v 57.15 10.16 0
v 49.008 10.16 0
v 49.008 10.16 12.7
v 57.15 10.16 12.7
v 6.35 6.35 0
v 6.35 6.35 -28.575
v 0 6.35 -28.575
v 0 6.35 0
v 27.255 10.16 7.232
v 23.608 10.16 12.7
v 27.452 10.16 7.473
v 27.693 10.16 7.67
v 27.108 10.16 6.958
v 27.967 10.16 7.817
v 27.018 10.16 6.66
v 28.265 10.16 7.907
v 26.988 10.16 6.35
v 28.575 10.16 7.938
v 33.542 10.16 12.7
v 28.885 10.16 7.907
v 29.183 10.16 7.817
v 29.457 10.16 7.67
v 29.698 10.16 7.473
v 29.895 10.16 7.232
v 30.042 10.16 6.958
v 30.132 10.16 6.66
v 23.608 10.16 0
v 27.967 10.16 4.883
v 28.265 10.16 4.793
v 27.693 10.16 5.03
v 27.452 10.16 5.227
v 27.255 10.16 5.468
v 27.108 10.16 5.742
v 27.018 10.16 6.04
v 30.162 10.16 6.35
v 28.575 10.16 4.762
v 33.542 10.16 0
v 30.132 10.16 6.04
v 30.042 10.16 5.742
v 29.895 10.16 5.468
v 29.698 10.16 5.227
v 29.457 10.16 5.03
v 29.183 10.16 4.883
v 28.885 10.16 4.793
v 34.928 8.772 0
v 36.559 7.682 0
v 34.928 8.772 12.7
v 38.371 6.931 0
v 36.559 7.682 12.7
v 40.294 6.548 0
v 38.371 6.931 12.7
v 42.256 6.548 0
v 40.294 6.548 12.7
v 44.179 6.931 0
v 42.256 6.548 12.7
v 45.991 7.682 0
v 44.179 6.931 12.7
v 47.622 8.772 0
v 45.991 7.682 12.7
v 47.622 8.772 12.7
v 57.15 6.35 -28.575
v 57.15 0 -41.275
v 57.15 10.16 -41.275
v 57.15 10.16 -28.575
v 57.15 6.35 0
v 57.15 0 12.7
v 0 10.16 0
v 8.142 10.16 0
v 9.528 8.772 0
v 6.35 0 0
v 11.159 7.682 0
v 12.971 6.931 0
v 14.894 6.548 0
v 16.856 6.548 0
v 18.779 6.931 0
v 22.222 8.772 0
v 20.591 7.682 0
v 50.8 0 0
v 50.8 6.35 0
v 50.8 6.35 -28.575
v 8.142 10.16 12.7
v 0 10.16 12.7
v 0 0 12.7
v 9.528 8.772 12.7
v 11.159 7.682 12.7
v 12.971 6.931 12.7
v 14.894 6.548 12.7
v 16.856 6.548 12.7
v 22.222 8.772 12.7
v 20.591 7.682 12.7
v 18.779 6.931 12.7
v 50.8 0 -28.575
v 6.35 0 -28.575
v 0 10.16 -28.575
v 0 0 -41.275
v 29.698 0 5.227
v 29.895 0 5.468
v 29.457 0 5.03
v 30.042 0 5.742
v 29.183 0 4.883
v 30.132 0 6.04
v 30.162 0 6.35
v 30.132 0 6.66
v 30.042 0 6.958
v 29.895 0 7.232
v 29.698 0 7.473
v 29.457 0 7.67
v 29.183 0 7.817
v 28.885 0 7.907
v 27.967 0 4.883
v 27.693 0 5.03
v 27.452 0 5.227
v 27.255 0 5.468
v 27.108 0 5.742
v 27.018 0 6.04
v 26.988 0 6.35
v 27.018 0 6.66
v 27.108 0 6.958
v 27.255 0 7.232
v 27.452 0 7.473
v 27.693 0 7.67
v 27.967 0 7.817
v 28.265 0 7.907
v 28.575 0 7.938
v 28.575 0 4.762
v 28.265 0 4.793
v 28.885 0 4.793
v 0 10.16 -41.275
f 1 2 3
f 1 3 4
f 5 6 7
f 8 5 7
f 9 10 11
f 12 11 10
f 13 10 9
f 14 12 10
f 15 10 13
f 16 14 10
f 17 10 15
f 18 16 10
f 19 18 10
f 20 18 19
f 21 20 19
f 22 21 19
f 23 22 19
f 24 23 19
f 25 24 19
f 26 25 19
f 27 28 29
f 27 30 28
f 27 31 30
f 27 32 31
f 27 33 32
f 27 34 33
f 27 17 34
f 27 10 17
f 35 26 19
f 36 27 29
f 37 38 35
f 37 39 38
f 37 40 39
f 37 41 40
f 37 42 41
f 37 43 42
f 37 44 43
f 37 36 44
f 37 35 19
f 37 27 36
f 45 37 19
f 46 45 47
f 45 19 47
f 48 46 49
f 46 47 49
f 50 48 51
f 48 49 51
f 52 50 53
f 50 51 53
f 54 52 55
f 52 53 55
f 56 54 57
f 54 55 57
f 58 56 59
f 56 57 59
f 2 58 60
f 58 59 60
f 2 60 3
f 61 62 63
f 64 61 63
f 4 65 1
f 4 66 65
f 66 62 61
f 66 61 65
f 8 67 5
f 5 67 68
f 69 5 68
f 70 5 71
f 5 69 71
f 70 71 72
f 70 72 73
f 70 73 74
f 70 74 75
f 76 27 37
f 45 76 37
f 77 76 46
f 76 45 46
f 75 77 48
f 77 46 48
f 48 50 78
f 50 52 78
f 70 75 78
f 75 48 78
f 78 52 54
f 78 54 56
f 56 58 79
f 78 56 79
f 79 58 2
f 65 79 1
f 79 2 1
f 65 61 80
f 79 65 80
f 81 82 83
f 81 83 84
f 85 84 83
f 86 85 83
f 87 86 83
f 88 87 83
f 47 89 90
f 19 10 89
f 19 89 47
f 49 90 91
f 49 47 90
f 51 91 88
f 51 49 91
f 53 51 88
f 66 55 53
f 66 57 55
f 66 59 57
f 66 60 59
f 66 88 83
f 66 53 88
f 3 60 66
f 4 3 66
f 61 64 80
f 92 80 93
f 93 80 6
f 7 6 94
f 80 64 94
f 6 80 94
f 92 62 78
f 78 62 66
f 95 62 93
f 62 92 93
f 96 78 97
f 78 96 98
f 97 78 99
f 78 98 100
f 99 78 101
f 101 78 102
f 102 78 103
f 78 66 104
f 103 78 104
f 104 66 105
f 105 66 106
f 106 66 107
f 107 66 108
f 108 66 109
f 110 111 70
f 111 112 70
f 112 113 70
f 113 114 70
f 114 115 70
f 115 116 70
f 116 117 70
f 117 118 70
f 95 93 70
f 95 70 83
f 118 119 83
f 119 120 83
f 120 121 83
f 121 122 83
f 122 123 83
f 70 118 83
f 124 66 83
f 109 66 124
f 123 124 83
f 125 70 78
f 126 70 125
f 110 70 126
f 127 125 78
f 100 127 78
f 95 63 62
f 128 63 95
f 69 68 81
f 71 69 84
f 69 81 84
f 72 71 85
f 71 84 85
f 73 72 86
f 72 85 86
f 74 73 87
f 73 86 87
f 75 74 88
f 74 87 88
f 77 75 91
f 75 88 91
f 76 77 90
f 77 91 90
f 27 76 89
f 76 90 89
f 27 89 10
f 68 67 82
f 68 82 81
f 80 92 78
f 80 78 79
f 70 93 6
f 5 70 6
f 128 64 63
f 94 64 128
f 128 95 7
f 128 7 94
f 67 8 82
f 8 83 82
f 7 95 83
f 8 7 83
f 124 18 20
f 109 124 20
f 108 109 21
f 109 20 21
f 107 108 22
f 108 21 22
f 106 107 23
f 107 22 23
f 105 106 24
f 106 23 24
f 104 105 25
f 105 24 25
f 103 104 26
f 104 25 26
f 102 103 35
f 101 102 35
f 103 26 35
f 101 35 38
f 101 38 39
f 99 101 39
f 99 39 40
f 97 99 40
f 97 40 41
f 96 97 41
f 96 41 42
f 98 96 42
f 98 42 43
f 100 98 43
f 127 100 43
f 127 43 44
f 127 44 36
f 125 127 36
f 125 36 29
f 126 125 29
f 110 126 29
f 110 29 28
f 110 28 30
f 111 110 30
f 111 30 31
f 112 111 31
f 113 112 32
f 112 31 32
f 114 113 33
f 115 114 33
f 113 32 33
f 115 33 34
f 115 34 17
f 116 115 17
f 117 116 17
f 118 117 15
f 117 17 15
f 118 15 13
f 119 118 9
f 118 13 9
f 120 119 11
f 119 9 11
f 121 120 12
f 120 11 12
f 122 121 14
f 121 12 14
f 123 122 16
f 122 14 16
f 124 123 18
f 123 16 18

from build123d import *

# Parameters (mm, degrees)
SKETCH4_W           = 57.15
SKETCH4_H           = 10.16
BOSS_EXTRUDE1_DEPTH = 12.7
SKETCH5_R           = 10
CUT_EXTRUDE1_DEPTH  = 60.419172832
SKETCH8_R           = 1.5875
CUT_EXTRUDE3_DEPTH  = 60.419172832
SKETCH9_W           = 6.35
SKETCH9_H           = 6.35
BOSS_EXTRUDE2_DEPTH = 28.575
SKETCH11_W          = 57.15
SKETCH11_H          = 10.16
BOSS_EXTRUDE3_DEPTH = 12.7


with BuildPart() as part:
    # Sketch4 → Boss-Extrude1 (new body)
    with BuildSketch(Plane.XY):
        with Locations((28.575, 5.08)):
            Rectangle(SKETCH4_W, SKETCH4_H)
    extrude(amount=BOSS_EXTRUDE1_DEPTH)

    # Sketch5 → Cut-Extrude1 (cut, through all)
    with BuildSketch(Plane.XY.offset(12.7)):
        with Locations((15.875, 16.5)):
            Circle(SKETCH5_R)
        with Locations((41.275, 16.5)):
            Circle(SKETCH5_R)
    extrude(amount=-CUT_EXTRUDE1_DEPTH, mode=Mode.SUBTRACT)

    # Sketch8 → Cut-Extrude3 (cut, through all)
    with BuildSketch(Plane(origin=(0, 10.16, 0), x_dir=(1, 0, 0), z_dir=(0, 1, 0))):
        with Locations(Location((28.575, -6.35, 0), (0, 0, 270))):
            Circle(SKETCH8_R)
    extrude(amount=-CUT_EXTRUDE3_DEPTH, mode=Mode.SUBTRACT)

    # Sketch9 → Boss-Extrude2 (add)
    with BuildSketch(Plane(origin=(0, 0, 0), x_dir=(-1, 0, 0), z_dir=(0, 0, -1))):
        with Locations((-53.975, 3.175)):
            Rectangle(SKETCH9_W, SKETCH9_H)
        with Locations((-3.175, 3.175)):
            Rectangle(SKETCH9_W, SKETCH9_H)
    extrude(amount=BOSS_EXTRUDE2_DEPTH)

    # Sketch11 → Boss-Extrude3 (add)
    with BuildSketch(Plane(origin=(0, 0, -28.575), x_dir=(-1, 0, 0), z_dir=(0, 0, -1))):
        with Locations((-28.575, 5.08)):
            Rectangle(SKETCH11_W, SKETCH11_H)
    extrude(amount=BOSS_EXTRUDE3_DEPTH)


solid = part.part
